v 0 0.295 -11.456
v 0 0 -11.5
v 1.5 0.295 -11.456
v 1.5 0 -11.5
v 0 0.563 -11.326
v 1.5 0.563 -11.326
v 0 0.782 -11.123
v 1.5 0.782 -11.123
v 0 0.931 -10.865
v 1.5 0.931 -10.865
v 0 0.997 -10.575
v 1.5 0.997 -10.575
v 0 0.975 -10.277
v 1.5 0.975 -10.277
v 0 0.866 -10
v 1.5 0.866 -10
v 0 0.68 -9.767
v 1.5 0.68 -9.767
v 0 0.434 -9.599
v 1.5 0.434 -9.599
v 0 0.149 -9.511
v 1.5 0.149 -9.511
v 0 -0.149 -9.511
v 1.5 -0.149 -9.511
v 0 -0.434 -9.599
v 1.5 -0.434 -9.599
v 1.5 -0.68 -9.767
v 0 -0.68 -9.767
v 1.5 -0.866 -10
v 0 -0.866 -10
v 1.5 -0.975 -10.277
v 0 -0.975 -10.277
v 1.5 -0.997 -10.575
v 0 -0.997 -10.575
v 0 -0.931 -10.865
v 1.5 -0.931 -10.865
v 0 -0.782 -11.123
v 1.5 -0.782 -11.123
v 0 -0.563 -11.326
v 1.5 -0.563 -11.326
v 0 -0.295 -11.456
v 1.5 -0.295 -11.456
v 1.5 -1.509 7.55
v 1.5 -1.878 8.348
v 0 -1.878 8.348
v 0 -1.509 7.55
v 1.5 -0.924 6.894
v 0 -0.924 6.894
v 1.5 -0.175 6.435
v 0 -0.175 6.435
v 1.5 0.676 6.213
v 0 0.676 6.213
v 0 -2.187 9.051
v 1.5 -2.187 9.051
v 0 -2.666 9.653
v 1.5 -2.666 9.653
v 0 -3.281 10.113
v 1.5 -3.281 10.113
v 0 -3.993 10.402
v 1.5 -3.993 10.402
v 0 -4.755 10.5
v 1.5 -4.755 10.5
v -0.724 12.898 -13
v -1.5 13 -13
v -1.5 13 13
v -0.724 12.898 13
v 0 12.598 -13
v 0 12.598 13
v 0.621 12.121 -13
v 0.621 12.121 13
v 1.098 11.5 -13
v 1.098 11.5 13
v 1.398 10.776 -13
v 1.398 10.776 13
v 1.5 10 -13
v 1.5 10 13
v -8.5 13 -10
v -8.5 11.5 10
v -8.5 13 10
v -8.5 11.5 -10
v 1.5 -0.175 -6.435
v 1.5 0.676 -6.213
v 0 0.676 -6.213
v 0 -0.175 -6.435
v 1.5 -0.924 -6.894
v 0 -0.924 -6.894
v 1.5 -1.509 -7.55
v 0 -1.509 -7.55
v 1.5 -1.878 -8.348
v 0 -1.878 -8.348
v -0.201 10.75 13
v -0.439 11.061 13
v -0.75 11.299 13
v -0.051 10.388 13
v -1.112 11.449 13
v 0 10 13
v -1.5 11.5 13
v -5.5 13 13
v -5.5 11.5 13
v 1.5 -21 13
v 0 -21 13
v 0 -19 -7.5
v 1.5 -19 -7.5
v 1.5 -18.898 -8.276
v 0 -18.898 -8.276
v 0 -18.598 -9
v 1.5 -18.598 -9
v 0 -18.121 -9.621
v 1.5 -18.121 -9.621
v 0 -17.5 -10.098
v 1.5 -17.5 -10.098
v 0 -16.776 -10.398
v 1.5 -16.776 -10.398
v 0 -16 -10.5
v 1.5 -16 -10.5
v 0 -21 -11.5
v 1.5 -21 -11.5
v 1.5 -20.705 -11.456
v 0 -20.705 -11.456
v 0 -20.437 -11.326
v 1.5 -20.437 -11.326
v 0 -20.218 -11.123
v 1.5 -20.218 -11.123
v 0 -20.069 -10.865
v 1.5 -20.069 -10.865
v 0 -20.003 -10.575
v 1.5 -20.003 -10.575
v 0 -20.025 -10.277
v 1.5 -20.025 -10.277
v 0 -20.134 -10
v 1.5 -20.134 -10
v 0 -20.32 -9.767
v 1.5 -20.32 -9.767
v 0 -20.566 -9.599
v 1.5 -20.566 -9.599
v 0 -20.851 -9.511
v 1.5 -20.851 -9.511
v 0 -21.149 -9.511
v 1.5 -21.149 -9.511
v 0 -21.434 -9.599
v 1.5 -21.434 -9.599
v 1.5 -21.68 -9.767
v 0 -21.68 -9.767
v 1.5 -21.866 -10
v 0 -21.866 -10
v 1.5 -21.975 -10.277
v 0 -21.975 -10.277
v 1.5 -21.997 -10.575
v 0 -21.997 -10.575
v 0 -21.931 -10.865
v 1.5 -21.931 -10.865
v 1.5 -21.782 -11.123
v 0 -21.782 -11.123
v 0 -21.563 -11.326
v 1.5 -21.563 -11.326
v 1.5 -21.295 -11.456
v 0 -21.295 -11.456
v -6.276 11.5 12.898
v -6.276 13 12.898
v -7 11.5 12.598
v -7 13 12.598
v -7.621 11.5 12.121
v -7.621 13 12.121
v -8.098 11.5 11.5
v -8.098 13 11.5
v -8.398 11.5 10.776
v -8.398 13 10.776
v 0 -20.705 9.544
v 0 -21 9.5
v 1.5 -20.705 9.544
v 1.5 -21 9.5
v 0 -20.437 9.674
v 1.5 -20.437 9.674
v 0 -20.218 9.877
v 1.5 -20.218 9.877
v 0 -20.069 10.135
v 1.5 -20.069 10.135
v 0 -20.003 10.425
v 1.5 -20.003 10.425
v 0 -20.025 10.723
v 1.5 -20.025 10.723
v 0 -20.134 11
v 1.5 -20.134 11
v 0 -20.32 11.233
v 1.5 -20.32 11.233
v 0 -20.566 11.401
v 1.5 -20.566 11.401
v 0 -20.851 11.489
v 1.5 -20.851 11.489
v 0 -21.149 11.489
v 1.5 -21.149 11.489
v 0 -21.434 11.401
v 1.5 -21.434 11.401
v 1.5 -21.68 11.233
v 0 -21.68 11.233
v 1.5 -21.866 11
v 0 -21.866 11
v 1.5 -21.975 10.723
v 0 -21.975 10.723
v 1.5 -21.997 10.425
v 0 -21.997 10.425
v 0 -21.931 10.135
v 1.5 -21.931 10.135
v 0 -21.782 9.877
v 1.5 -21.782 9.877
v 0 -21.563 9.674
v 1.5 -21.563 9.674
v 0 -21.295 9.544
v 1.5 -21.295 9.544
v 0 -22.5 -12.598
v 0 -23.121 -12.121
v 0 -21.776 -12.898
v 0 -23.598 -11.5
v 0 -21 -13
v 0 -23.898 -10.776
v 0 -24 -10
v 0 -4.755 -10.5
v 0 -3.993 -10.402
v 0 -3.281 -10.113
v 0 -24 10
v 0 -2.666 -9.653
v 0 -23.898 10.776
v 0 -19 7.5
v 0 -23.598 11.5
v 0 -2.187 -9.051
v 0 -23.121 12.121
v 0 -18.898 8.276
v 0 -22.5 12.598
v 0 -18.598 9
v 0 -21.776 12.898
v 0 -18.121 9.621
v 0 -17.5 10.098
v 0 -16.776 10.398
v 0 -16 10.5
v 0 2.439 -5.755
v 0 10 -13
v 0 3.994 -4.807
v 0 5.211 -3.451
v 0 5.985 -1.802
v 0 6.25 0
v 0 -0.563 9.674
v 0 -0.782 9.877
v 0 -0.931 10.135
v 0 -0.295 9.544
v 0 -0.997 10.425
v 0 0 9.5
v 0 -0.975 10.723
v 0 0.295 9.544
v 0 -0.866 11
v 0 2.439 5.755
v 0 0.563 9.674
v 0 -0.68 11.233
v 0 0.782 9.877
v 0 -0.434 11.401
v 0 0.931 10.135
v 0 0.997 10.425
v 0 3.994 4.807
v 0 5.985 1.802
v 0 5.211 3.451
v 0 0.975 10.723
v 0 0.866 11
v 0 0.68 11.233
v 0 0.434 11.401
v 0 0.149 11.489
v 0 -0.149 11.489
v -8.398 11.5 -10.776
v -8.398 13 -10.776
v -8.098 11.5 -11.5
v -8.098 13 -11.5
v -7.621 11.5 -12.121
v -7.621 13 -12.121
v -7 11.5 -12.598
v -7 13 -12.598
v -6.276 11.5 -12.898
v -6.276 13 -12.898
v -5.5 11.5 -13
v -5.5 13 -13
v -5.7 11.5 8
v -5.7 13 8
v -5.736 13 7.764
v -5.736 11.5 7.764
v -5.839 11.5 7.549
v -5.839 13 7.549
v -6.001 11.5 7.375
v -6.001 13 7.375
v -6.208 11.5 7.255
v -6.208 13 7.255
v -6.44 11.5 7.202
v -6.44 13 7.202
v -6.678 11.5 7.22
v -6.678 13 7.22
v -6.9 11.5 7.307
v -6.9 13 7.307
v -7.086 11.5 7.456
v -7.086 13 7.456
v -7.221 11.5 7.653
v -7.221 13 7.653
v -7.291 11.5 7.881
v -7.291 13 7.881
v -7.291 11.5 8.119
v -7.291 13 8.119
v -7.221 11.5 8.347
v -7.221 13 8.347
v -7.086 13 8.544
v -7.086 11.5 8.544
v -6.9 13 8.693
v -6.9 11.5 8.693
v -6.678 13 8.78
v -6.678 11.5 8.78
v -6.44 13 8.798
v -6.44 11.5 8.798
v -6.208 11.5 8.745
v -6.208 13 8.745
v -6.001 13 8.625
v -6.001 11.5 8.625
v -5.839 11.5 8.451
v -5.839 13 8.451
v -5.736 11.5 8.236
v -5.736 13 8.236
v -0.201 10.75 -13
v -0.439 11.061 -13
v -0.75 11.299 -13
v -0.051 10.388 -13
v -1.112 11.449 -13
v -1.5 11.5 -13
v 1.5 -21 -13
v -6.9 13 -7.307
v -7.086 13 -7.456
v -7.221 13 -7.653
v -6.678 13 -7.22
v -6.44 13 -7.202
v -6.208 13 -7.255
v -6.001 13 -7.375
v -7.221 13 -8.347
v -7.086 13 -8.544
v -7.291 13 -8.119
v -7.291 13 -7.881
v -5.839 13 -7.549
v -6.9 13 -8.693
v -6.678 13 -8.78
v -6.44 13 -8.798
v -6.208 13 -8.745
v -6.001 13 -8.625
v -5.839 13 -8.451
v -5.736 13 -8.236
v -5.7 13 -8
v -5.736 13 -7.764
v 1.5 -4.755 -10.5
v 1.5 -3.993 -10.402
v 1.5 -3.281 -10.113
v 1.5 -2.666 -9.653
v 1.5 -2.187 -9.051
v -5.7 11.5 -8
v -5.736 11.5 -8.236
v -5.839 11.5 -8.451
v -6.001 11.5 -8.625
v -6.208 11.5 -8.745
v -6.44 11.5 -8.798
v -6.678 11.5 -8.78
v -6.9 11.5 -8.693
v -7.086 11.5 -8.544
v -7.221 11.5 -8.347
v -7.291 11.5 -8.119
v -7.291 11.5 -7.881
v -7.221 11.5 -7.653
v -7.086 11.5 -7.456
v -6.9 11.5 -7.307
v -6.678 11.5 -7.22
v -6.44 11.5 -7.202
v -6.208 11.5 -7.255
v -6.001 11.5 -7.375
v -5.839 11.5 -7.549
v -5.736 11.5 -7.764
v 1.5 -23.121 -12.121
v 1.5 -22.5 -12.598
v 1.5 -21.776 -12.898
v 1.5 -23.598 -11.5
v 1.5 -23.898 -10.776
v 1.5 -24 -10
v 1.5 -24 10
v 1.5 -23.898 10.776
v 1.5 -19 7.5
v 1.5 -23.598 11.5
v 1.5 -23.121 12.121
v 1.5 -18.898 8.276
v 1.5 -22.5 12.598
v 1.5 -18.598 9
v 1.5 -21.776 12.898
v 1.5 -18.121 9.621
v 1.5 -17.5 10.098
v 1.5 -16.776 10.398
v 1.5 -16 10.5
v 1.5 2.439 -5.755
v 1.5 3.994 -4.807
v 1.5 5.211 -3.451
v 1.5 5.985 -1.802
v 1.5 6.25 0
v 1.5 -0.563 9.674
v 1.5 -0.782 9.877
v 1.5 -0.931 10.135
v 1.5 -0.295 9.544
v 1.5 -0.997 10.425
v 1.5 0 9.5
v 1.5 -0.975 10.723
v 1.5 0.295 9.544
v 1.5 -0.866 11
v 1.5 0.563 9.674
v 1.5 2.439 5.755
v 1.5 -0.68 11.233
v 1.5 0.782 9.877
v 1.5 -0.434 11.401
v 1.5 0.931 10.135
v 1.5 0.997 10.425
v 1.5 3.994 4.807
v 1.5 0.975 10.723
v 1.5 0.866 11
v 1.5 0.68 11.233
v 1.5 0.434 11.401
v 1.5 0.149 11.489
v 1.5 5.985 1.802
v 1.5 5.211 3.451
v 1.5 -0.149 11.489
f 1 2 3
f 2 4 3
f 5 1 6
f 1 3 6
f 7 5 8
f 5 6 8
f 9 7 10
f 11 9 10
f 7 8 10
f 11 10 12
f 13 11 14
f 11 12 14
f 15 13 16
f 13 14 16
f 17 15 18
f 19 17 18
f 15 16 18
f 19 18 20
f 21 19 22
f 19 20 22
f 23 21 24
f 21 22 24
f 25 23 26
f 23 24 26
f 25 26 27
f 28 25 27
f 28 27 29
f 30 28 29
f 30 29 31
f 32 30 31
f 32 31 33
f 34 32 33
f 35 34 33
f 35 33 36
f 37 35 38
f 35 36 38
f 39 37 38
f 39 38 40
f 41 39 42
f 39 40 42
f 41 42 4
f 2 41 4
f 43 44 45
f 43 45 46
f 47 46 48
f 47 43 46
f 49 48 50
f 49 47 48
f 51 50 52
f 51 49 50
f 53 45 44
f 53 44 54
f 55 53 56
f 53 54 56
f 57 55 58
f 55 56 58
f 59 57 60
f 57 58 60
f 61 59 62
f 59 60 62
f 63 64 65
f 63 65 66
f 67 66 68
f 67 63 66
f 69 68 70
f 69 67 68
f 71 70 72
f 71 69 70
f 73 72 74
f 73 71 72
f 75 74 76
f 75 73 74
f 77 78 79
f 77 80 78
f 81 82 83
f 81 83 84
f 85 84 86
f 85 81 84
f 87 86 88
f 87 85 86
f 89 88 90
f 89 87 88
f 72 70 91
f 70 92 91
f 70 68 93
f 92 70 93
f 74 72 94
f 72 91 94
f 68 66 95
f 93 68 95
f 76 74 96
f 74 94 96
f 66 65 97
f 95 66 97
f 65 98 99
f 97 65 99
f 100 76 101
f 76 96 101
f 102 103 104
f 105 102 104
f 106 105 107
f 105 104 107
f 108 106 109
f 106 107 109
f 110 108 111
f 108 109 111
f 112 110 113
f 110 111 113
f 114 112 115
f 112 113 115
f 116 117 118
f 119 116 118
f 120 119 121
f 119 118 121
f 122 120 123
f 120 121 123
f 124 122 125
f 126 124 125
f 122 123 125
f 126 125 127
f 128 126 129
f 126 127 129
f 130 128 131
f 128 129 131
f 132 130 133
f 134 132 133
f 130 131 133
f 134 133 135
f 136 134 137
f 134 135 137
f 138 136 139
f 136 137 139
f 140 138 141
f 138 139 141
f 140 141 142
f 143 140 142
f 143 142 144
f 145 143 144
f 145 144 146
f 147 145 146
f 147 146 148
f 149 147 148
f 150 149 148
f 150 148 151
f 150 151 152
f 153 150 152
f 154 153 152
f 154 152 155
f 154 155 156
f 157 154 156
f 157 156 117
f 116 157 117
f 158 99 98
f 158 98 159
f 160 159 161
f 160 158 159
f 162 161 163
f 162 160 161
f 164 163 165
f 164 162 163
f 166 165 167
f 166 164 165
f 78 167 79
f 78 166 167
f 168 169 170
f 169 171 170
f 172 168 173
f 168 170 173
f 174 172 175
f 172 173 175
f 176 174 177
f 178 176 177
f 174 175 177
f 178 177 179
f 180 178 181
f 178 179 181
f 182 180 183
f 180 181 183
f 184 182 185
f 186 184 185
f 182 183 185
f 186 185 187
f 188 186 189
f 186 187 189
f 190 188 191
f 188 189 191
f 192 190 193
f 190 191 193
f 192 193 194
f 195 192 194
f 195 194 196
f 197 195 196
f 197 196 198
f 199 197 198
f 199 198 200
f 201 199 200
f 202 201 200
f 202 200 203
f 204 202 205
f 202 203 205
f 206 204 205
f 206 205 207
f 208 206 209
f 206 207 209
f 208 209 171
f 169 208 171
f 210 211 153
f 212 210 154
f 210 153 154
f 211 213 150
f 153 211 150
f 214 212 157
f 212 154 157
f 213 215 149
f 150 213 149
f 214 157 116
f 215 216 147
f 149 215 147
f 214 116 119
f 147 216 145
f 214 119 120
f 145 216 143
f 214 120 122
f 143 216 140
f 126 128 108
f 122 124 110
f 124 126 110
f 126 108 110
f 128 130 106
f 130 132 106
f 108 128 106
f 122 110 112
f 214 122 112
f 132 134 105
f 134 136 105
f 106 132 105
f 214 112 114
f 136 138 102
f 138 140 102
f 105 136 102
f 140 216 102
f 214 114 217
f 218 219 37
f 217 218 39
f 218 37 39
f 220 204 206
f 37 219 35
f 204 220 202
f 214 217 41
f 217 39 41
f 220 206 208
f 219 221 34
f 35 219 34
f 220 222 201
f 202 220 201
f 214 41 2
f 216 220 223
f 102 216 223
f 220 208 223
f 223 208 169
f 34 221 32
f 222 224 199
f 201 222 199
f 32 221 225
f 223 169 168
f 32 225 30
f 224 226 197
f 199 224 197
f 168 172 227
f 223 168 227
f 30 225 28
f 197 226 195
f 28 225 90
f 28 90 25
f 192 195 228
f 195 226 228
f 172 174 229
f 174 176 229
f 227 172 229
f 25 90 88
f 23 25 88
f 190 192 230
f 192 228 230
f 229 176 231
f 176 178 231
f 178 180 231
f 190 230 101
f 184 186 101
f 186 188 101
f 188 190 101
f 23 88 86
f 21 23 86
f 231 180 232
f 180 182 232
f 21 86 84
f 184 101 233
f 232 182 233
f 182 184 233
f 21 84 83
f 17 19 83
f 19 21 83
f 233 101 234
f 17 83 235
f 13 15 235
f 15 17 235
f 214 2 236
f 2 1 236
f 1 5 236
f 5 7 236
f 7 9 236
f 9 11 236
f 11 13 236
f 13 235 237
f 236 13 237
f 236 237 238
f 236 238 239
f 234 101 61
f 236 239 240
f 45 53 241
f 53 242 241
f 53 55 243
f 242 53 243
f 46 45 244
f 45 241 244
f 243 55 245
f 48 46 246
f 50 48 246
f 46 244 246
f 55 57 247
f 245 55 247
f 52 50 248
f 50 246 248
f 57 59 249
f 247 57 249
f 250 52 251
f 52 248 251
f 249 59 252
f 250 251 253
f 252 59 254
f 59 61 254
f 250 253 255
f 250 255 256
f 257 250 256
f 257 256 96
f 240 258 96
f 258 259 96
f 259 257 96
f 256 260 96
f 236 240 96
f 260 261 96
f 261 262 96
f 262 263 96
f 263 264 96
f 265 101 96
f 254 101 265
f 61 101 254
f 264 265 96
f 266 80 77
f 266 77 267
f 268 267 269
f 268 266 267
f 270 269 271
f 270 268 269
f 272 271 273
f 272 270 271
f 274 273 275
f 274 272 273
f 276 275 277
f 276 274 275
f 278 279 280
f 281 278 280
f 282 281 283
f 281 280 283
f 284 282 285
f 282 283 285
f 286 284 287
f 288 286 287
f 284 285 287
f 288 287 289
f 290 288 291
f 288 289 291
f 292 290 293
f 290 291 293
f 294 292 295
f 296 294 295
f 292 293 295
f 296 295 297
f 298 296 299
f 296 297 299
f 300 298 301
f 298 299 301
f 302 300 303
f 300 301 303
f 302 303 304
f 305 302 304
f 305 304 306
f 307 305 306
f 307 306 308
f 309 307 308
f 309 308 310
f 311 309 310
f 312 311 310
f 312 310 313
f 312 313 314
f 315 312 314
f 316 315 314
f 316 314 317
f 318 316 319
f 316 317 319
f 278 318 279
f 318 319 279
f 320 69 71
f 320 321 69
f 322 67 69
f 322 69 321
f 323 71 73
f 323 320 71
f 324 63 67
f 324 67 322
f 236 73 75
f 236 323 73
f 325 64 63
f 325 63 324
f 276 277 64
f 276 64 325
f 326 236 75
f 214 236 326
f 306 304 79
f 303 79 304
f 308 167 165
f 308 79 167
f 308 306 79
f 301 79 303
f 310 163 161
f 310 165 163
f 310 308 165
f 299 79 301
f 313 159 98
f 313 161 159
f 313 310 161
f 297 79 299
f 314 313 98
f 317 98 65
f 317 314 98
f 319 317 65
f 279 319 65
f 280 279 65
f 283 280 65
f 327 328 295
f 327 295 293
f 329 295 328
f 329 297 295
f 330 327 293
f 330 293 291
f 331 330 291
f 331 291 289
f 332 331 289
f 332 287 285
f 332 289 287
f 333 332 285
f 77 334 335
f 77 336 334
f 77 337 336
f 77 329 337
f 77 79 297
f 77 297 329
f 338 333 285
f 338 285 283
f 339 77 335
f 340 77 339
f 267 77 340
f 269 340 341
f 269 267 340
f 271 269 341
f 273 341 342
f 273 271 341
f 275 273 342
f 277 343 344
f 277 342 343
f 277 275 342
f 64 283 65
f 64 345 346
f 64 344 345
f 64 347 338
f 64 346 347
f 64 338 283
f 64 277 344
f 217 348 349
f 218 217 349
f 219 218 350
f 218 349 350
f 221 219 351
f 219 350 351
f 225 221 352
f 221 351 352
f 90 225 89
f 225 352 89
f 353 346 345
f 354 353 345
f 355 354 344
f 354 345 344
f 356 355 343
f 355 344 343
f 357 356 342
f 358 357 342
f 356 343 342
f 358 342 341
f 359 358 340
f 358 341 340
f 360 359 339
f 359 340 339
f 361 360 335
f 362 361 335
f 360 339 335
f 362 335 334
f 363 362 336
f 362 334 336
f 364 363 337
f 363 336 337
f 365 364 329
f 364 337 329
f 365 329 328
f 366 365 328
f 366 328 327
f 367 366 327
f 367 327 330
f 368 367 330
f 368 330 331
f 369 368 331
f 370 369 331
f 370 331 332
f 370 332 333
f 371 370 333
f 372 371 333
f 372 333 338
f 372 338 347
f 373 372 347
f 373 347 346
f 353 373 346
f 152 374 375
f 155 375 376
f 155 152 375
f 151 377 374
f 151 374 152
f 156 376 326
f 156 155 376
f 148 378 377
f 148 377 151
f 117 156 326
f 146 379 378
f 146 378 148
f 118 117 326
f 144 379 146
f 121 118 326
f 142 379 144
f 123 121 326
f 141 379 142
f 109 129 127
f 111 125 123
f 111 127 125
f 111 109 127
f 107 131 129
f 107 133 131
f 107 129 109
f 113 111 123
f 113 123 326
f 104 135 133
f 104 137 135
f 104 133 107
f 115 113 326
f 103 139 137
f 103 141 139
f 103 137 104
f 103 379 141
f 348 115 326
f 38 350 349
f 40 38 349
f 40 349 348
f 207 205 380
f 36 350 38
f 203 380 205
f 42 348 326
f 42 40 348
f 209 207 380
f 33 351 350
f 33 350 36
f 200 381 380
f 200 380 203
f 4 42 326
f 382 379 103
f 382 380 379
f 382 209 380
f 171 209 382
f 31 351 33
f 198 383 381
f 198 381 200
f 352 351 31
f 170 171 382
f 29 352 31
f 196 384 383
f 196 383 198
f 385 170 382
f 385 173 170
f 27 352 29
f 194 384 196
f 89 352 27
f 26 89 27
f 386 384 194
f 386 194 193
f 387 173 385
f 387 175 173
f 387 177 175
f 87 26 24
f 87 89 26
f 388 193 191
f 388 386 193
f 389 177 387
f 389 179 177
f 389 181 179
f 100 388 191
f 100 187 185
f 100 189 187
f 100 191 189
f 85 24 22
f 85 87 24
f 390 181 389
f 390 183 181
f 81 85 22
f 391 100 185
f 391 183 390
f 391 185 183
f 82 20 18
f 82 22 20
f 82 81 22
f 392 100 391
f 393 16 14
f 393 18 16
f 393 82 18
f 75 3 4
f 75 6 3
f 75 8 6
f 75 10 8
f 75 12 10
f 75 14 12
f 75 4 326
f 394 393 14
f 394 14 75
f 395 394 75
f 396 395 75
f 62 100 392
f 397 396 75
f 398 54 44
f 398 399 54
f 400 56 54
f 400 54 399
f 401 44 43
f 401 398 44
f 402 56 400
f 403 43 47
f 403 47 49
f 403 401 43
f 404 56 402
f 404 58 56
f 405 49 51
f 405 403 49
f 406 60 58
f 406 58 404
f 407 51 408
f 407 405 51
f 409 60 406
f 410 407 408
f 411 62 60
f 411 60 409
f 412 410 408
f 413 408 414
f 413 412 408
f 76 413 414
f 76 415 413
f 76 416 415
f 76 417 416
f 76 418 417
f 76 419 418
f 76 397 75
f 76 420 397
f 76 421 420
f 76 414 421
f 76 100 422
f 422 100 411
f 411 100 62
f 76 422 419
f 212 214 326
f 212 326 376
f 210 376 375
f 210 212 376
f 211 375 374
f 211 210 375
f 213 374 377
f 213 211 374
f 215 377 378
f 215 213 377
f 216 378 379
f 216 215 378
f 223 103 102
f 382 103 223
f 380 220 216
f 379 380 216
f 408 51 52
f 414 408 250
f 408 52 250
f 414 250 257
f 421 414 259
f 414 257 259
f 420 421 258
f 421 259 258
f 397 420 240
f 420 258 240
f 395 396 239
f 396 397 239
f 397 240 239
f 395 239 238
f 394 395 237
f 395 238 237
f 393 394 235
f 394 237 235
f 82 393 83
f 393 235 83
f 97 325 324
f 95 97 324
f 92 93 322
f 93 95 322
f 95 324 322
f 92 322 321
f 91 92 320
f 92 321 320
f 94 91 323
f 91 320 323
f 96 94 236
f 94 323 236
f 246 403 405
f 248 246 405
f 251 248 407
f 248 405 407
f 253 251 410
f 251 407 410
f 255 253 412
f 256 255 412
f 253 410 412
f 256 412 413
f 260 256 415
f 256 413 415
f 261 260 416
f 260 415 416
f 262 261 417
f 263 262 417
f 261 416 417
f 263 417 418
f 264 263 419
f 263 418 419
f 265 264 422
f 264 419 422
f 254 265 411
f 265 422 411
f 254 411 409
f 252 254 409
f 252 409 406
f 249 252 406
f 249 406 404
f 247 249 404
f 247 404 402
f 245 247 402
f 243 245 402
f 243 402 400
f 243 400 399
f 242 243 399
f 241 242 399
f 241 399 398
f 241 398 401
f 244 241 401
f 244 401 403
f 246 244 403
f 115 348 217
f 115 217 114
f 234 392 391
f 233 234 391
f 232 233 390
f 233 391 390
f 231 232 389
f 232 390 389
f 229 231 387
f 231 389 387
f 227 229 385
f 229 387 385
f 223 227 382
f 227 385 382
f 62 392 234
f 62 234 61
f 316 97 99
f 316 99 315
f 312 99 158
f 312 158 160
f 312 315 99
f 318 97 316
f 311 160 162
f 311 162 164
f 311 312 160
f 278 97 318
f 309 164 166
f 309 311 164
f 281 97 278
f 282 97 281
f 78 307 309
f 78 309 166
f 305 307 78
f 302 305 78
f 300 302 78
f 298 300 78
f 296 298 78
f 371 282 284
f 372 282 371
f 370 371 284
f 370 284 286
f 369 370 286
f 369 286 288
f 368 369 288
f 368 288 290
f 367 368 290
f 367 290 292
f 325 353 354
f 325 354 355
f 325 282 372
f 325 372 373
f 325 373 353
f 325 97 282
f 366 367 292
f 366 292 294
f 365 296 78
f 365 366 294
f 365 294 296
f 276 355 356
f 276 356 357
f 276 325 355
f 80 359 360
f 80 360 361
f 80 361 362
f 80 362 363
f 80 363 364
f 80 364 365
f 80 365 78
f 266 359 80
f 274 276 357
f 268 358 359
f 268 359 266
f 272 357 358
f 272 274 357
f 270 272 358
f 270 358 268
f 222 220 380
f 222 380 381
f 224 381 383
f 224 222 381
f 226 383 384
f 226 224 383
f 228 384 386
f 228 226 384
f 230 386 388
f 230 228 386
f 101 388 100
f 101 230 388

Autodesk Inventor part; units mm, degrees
ref_plane "YZ Plane" through (0, 0, 0) normal (1, 0, 0) x (0, 1, 0)
ref_plane "XZ Plane" through (0, 0, 0) normal (0, 1, 0) x (-1, 0, 0)
ref_plane "XY Plane" through (0, 0, 0) normal (0, 0, 1) x (1, 0, 0)
sketch "スケッチ1" plane through (0, 0, 0) normal (1, 0, 0) x (0, 1, 0)
  circle A0 centre (0, 0) radius 6.25
  line L0 (0, 13) -> (-24, 13)
  line L1 (-24, 13) -> (-24, -13)
  line L2 (-24, -13) -> (0, -13)
  line L3 (0, -13) -> (0, 13) construction
  line L4 (0, 13) -> (13, 13)
  line L5 (13, 13) -> (13, -13)
  line L6 (13, -13) -> (0, -13)
  line L7 (0, -13) -> (0, 13)
  dimension "d0" = 12.5
  dimension "d1" = 24
  dimension "d2" = 26
  dimension "d3" = 13
extrude "プレート1" add sketch "スケッチ1" along normal blind 1.5 contours A0 L7 L4 L5 L6 | A0 L7 L2 L1 L0
sketch "スケッチ2" plane through (1.5, 11.5, -13) normal (0, 1, 0) x (-1, 0, 0)
  line L0 (0, 26) -> (0, 0)
  line L1 (0, 0) -> (10, 0)
  line L2 (10, 0) -> (10, 26)
  line L3 (10, 26) -> (0, 26)
edge flange "フランジ1" height 10 angle 90 thickness 1.5 bend radius 1.5 thickness toward (0, 1, 0) relief tear relief width 1.5 relief depth 0.75 edges at (0, 13, 0) wall of the first edge with corners at (1.5, 11.5, 13) (1.5, 11.5, -13) (-8.5, 11.5, -13) (-8.5, 11.5, 13)
bend "曲げ1"
corner "コーナー1"
sketch "スケッチ3" plane through (1.5, 0, 0) normal (1, 0, 0) x (0, 0, -1)
  circle A0 centre (10.5, 0) radius 1 projected
  circle A1 centre (-10.5, 0) radius 1 projected
  circle A2 centre (-10.5, -21) radius 1 projected
  circle A3 centre (10.5, -21) radius 1 projected
  point P0 (0, 0)
extrude "切り取り1" cut sketch "スケッチ3" against normal blind 1.5
sketch "スケッチ4" plane through (1.5, 0, 0) normal (1, 0, 0) x (0, 0, -1)
  circle A0 centre (-10.5, -21) radius 1 projected
  circle A1 centre (10.5, 0) radius 1 projected
  circle A2 centre (-10.5, 0) radius 1 projected
  circle A3 centre (10.5, -21) radius 1 projected
  line L0 (13, 10) -> (-13, 10) projected
  line L1 (-13, -24) -> (-13, 10) projected
  line L2 (13, -24) -> (-13, -24) projected
  line L3 (13, 10) -> (13, -24) projected
  circle A4 centre (0, 0) radius 6.25 projected
  line L4 (-10.5, 0) -> (10.5, 0)
  line L5 (10.5, 0) -> (10.5, -21)
  line L6 (10.5, -21) -> (-10.5, -21)
  line L7 (-10.5, -21) -> (-10.5, 0)
  line L8 (-10.5, -2) -> (10.5, -2)
  line L9 (10.5, -2) -> (10.5, -19)
  line L10 (10.5, -19) -> (-10.5, -19)
  line L11 (-10.5, -19) -> (-10.5, -2)
  dimension "d17" = 2
  dimension "d18" = 2
extrude "切り取り2" cut sketch "スケッチ4" against normal blind 1.5 contours L7 L8 A4 L5 L10 | L8 A4
sketch "スケッチ5" plane through (-8.5, 13, 13) normal (0, 1, 0) x (1, 0, 0)
  circle A0 centre (2, 21) radius 0.8
  circle A1 centre (2, 5) radius 0.8
  line L0 (0, 0) -> (0, 26) projected
  line L1 (0, 26) -> (7, 26) projected
  line L2 (7, 0) -> (0, 0) projected
  point P0 (8.5, 13)
  dimension "d21" = 1.6
  dimension "d23" = 2
  dimension "d24" = 5
  dimension "d25" = 5
extrude "切り取り3" cut sketch "スケッチ5" against normal blind 1.5
fillet "フィレット1" radius 3 10 edges at (-8.5, 12.25, -13) (-8.5, 12.25, 13) (0.75, -2, 5.9214) (0.75, -2, -5.9214) (0.75, -2, -10.5) (0.75, -2, 10.5) (0.75, -24, -13) (0.75, -24, 13) (0.75, -19, -10.5) (0.75, -19, 10.5)
equation "\"d15\" = Thickness"
equation "\"d18\" = d17"
equation "\"d19\" = Thickness"
equation "\"d25\" = d24"
equation "\"d26\" = Thickness"
equation "\"d4\" = Thickness"
equation "\"d5\" = BendReliefWidth"
equation "\"d6\" = BendReliefDepth"
equation "\"d7\" = MinimumRemnant"
equation "\"d8\" = TransitionRadius"
equation "\"d11\" = BendRadius"
equation "\"d12\" = CornerReliefSize"
equation "\"d13\" = GapSize"
equation "\"d14\" = JacobiRadiusSize"
equation "\"BendRadius\" = Thickness"
equation "\"BendReliefWidth\" = Thickness"
equation "\"BendReliefDepth\" = 0.5 * Thickness"
equation "\"CornerReliefSize\" = 4 * Thickness"
equation "\"MinimumRemnant\" = 2 * Thickness"
equation "\"TransitionRadius\" = BendRadius"
equation "\"JacobiRadiusSize\" = BendRadius"
equation "\"GapSize\" = Thickness"
equation "\"Thickness\" = 1.5"
properties part number "neck_joint"
